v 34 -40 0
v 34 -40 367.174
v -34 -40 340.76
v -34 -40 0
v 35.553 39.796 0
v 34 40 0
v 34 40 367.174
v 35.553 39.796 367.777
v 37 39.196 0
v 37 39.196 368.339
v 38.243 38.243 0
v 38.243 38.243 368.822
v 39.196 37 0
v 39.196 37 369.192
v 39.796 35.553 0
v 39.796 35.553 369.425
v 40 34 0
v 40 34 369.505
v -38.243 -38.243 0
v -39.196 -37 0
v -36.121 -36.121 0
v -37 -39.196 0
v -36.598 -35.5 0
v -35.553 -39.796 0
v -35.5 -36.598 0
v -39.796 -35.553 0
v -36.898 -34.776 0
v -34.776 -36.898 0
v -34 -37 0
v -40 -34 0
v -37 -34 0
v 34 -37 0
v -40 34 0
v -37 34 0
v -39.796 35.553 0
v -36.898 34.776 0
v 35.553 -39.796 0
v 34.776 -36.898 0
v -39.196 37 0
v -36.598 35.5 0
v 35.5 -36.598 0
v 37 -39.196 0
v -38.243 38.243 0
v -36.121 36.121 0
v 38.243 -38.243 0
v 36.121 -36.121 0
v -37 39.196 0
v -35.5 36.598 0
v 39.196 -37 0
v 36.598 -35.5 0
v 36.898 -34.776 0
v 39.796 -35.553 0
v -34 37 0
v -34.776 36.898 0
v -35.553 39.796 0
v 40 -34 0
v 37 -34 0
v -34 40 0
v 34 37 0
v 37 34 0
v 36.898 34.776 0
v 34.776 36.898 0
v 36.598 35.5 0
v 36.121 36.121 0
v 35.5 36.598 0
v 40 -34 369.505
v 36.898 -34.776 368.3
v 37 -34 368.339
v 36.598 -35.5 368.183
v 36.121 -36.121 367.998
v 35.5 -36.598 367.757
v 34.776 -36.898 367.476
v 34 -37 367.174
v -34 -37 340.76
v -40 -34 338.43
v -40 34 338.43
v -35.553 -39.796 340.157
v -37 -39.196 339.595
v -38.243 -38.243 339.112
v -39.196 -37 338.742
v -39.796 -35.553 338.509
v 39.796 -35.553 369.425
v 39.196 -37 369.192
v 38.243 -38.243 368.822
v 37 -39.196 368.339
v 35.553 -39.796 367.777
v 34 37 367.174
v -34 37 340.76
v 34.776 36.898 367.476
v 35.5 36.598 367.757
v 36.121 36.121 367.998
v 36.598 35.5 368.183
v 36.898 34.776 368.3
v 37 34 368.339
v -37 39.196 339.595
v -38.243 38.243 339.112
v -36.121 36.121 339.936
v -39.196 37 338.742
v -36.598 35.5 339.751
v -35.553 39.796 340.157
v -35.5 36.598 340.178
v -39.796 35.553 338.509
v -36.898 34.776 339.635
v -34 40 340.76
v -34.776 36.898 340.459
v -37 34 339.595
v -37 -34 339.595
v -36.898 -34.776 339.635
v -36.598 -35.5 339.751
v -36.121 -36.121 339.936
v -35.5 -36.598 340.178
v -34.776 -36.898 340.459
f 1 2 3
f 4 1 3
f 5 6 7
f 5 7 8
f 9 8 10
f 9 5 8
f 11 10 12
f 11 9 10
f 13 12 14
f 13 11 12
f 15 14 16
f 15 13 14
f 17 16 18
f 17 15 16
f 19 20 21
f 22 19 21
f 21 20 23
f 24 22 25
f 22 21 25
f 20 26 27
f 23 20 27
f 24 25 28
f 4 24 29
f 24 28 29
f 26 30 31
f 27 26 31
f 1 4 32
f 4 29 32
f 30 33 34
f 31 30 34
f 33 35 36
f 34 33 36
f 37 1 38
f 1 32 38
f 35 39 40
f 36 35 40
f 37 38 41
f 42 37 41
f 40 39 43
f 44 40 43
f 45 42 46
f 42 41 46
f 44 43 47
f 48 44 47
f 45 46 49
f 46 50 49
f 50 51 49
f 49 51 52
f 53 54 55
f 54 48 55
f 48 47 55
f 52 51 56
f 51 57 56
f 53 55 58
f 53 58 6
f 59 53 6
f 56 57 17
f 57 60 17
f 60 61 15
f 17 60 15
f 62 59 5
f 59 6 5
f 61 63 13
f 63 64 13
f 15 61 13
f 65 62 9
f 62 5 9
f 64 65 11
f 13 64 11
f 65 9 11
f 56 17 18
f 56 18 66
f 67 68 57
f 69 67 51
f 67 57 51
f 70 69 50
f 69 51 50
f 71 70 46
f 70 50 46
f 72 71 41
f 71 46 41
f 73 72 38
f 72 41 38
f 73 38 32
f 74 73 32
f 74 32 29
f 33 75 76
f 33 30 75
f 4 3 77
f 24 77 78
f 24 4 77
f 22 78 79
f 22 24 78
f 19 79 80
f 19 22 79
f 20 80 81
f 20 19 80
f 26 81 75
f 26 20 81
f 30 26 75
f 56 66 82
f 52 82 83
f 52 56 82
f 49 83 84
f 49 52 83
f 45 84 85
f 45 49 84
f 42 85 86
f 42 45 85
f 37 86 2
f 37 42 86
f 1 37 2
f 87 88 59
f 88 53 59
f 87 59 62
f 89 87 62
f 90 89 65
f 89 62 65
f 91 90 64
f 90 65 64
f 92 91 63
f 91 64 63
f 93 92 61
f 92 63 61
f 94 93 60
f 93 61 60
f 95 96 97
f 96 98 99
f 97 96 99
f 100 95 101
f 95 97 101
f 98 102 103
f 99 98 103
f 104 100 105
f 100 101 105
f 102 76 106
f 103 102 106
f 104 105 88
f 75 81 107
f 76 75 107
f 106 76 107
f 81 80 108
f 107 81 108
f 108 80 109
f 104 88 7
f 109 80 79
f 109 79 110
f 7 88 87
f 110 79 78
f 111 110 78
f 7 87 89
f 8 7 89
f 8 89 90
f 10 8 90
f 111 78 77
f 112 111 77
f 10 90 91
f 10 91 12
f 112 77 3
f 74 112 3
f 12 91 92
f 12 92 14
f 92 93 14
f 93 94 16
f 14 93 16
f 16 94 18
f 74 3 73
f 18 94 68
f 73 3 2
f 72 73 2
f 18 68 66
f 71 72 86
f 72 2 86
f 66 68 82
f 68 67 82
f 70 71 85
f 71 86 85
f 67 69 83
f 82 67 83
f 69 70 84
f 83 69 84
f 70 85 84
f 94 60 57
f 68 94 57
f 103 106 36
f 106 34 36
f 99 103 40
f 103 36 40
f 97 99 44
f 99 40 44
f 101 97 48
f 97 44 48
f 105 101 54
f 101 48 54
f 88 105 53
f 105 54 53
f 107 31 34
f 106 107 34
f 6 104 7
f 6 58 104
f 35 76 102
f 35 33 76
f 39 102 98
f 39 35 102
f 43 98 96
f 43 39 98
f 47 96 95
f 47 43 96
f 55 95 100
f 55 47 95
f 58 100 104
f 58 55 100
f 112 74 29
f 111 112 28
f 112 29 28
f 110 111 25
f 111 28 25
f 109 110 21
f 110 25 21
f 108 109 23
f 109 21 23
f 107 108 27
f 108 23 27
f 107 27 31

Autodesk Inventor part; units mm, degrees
ref_plane "YZ Plane" through (0, 0, 0) normal (1, 0, 0) x (0, 1, 0)
ref_plane "Start plane" through (0, 0, 0) normal (0, 0, 1) x (1, 0, 0)
ref_plane "End plane" through (0, 0, 1000) normal (0, 0, 1) x (1, 0, 0)
sketch "Sketch" plane through (0, 0, 0) normal (0, 0, 1) x (1, 0, 0)
  line L0 (-40, -34) -> (-40, 34)
  line L1 (-34, 40) -> (34, 40)
  line L2 (40, 34) -> (40, -34)
  line L3 (34, -40) -> (-34, -40)
  arc A0 (-40, -34) -> (-34, -40) centre (-34, -34) ccw
  arc A1 (40, 34) -> (34, 40) centre (34, 34) ccw
  arc A2 (-34, 40) -> (-40, 34) centre (-34, 34) ccw
  arc A3 (34, -40) -> (40, -34) centre (34, -34) ccw
  arc A4 (-34, 37) -> (-37, 34) centre (-34, 34) ccw
  line L4 (-34, 37) -> (34, 37)
  arc A5 (37, 34) -> (34, 37) centre (34, 34) ccw
  line L5 (37, 34) -> (37, -34)
  arc A6 (34, -37) -> (37, -34) centre (34, -34) ccw
  line L6 (34, -37) -> (-34, -37)
  arc A7 (-37, -34) -> (-34, -37) centre (-34, -34) ccw
  line L7 (-37, -34) -> (-37, 34)
  line L8 (0, 57.7397) -> (0, -57.7397) construction
  line L9 (-1453.6197, 0) -> (290.3864, 0) construction
  dimension "d7" = 6
  dimension "d9" = 80
  dimension "d11" = 80
  dimension "d12" = 3
  dimension "d15" = 40
  dimension "d16" = 40
extrude "Body" add sketch "Sketch" along normal up to surface (1000 mm away) from surface at 0
sketch "Sketch3" plane through (0, 0, 0) normal (0, 0, 1) x (1, 0, 0)
  line L0 (0, 0) -> (10, 0)
ref_plane "Work Plane3" through (0, 0, 0) normal (0, -1, 0) x (1, 0, 0)
sketch "Sketch5" plane through (0, 0, 0) normal (0, 1, 0) x (-1, 0, 0)
  line L0 (-40, 0) -> (-40, 1000) projected
  line L1 (40, 0) -> (40, 1000) projected
  line L2 (40, 0) -> (40, 1000) projected
  line L3 (40, 349.1577) -> (340, 349.1577) construction
  line L4 (-80.663, 399.3796) -> (760.663, 399.3796) construction
  arc A0 (-80.663, 399.3796) -> (340, 300) centre (340, 1240) ccw construction
  line L5 (-130, 479.2385) -> (810, 479.2385) construction
  arc A1 (-130, 479.2385) -> (-80.663, 399.3796) centre (-40.7, 479.2385) ccw construction
  arc A2 (760.663, 399.3796) -> (810, 479.2385) centre (720.7, 479.2385) ccw
  line L6 (-130, 479.2385) -> (-130, 519.2385)
  line L7 (810, 479.2385) -> (810, 519.2385)
  line L8 (-130, 519.2385) -> (340, 519.2385) construction
  line L9 (340, 519.2385) -> (340, 0)
  arc A3 (340, 300) -> (760.663, 399.3796) centre (340, 1240) ccw
  line L10 (340, 519.2385) -> (810, 519.2385)
  point P0 (0, 0)
  dimension "d22" = 300
  dimension "d24" = 940
  dimension "d25" = 89.3
  dimension "d26" = 40
  dimension "d27" = 940
  dimension "d28" = 300
  dimension "d30" = 349.1577
sketch "Sketch6" plane through (0, 0, 0) normal (0, 1, 0) x (-1, 0, 0)
  line L0 (40, 0) -> (40, 1000) projected
  line L1 (40, 0) -> (40, 1000) projected
  line L2 (-40, 0) -> (-40, 1000) projected
  line L3 (-40, 0) -> (-40, 1000) projected
  line L4 (34, 1000) -> (40, 1000) projected
  line L5 (40, 1000) -> (-40, 1000)
  line L6 (-40, 380.2326) -> (40, 349.1577)
  arc A0 (-80.663, 399.3796) -> (340, 300) centre (340, 1240) ccw construction
  line L7 (40, 338.4298) -> (-40, 369.5047)
  point P0 (0, 0)
  point P1 (-40, 380.2326)
  dimension "d33" = 10
extrude "Extrusion2" cut sketch "Sketch6" along normal through all both and the other way through all
sketch "Sketch4" plane through (0, 0, 0) normal (0, -1, 0) x (1, 0, 0)
  line L0 (-1453.3712, 0) -> (288.8952, 0) projected
  line L1 (-1453.3712, 1000) -> (288.8952, 1000) projected
  dimension "d18" = 1000
equation "\"d7\" = G_IR"
equation "\"d9\" = G_W"
equation "\"d11\" = G_H"
equation "\"d12\" = G_T"
equation "\"d15\" = 0.5 * d9"
equation "\"d16\" = 0.5 * d11"
equation "\"d3\" = G_L"
equation "\"d22\" = 0.5 * Diam_of_legs_center"
equation "\"d24\" = d27"
equation "\"d25\" = 0.095 * d27"
equation "\"d27\" = MAIN_filter_diam"
equation "\"G_W\" = 80"
equation "\"G_H\" = 80"
equation "\"G_T\" = 3"
equation "\"G_IR\" = 6"
equation "\"G_L\" = d18"
equation "\"G_OFFSET_START\" = 0"
equation "\"G_OFFSET_END\" = 0"
equation "\"Diam_of_legs_center\" = 600"
equation "\"MAIN_filter_diam\" = 940"
properties part number "PNS 1692 Leg tube" material "Steel, Mild"
